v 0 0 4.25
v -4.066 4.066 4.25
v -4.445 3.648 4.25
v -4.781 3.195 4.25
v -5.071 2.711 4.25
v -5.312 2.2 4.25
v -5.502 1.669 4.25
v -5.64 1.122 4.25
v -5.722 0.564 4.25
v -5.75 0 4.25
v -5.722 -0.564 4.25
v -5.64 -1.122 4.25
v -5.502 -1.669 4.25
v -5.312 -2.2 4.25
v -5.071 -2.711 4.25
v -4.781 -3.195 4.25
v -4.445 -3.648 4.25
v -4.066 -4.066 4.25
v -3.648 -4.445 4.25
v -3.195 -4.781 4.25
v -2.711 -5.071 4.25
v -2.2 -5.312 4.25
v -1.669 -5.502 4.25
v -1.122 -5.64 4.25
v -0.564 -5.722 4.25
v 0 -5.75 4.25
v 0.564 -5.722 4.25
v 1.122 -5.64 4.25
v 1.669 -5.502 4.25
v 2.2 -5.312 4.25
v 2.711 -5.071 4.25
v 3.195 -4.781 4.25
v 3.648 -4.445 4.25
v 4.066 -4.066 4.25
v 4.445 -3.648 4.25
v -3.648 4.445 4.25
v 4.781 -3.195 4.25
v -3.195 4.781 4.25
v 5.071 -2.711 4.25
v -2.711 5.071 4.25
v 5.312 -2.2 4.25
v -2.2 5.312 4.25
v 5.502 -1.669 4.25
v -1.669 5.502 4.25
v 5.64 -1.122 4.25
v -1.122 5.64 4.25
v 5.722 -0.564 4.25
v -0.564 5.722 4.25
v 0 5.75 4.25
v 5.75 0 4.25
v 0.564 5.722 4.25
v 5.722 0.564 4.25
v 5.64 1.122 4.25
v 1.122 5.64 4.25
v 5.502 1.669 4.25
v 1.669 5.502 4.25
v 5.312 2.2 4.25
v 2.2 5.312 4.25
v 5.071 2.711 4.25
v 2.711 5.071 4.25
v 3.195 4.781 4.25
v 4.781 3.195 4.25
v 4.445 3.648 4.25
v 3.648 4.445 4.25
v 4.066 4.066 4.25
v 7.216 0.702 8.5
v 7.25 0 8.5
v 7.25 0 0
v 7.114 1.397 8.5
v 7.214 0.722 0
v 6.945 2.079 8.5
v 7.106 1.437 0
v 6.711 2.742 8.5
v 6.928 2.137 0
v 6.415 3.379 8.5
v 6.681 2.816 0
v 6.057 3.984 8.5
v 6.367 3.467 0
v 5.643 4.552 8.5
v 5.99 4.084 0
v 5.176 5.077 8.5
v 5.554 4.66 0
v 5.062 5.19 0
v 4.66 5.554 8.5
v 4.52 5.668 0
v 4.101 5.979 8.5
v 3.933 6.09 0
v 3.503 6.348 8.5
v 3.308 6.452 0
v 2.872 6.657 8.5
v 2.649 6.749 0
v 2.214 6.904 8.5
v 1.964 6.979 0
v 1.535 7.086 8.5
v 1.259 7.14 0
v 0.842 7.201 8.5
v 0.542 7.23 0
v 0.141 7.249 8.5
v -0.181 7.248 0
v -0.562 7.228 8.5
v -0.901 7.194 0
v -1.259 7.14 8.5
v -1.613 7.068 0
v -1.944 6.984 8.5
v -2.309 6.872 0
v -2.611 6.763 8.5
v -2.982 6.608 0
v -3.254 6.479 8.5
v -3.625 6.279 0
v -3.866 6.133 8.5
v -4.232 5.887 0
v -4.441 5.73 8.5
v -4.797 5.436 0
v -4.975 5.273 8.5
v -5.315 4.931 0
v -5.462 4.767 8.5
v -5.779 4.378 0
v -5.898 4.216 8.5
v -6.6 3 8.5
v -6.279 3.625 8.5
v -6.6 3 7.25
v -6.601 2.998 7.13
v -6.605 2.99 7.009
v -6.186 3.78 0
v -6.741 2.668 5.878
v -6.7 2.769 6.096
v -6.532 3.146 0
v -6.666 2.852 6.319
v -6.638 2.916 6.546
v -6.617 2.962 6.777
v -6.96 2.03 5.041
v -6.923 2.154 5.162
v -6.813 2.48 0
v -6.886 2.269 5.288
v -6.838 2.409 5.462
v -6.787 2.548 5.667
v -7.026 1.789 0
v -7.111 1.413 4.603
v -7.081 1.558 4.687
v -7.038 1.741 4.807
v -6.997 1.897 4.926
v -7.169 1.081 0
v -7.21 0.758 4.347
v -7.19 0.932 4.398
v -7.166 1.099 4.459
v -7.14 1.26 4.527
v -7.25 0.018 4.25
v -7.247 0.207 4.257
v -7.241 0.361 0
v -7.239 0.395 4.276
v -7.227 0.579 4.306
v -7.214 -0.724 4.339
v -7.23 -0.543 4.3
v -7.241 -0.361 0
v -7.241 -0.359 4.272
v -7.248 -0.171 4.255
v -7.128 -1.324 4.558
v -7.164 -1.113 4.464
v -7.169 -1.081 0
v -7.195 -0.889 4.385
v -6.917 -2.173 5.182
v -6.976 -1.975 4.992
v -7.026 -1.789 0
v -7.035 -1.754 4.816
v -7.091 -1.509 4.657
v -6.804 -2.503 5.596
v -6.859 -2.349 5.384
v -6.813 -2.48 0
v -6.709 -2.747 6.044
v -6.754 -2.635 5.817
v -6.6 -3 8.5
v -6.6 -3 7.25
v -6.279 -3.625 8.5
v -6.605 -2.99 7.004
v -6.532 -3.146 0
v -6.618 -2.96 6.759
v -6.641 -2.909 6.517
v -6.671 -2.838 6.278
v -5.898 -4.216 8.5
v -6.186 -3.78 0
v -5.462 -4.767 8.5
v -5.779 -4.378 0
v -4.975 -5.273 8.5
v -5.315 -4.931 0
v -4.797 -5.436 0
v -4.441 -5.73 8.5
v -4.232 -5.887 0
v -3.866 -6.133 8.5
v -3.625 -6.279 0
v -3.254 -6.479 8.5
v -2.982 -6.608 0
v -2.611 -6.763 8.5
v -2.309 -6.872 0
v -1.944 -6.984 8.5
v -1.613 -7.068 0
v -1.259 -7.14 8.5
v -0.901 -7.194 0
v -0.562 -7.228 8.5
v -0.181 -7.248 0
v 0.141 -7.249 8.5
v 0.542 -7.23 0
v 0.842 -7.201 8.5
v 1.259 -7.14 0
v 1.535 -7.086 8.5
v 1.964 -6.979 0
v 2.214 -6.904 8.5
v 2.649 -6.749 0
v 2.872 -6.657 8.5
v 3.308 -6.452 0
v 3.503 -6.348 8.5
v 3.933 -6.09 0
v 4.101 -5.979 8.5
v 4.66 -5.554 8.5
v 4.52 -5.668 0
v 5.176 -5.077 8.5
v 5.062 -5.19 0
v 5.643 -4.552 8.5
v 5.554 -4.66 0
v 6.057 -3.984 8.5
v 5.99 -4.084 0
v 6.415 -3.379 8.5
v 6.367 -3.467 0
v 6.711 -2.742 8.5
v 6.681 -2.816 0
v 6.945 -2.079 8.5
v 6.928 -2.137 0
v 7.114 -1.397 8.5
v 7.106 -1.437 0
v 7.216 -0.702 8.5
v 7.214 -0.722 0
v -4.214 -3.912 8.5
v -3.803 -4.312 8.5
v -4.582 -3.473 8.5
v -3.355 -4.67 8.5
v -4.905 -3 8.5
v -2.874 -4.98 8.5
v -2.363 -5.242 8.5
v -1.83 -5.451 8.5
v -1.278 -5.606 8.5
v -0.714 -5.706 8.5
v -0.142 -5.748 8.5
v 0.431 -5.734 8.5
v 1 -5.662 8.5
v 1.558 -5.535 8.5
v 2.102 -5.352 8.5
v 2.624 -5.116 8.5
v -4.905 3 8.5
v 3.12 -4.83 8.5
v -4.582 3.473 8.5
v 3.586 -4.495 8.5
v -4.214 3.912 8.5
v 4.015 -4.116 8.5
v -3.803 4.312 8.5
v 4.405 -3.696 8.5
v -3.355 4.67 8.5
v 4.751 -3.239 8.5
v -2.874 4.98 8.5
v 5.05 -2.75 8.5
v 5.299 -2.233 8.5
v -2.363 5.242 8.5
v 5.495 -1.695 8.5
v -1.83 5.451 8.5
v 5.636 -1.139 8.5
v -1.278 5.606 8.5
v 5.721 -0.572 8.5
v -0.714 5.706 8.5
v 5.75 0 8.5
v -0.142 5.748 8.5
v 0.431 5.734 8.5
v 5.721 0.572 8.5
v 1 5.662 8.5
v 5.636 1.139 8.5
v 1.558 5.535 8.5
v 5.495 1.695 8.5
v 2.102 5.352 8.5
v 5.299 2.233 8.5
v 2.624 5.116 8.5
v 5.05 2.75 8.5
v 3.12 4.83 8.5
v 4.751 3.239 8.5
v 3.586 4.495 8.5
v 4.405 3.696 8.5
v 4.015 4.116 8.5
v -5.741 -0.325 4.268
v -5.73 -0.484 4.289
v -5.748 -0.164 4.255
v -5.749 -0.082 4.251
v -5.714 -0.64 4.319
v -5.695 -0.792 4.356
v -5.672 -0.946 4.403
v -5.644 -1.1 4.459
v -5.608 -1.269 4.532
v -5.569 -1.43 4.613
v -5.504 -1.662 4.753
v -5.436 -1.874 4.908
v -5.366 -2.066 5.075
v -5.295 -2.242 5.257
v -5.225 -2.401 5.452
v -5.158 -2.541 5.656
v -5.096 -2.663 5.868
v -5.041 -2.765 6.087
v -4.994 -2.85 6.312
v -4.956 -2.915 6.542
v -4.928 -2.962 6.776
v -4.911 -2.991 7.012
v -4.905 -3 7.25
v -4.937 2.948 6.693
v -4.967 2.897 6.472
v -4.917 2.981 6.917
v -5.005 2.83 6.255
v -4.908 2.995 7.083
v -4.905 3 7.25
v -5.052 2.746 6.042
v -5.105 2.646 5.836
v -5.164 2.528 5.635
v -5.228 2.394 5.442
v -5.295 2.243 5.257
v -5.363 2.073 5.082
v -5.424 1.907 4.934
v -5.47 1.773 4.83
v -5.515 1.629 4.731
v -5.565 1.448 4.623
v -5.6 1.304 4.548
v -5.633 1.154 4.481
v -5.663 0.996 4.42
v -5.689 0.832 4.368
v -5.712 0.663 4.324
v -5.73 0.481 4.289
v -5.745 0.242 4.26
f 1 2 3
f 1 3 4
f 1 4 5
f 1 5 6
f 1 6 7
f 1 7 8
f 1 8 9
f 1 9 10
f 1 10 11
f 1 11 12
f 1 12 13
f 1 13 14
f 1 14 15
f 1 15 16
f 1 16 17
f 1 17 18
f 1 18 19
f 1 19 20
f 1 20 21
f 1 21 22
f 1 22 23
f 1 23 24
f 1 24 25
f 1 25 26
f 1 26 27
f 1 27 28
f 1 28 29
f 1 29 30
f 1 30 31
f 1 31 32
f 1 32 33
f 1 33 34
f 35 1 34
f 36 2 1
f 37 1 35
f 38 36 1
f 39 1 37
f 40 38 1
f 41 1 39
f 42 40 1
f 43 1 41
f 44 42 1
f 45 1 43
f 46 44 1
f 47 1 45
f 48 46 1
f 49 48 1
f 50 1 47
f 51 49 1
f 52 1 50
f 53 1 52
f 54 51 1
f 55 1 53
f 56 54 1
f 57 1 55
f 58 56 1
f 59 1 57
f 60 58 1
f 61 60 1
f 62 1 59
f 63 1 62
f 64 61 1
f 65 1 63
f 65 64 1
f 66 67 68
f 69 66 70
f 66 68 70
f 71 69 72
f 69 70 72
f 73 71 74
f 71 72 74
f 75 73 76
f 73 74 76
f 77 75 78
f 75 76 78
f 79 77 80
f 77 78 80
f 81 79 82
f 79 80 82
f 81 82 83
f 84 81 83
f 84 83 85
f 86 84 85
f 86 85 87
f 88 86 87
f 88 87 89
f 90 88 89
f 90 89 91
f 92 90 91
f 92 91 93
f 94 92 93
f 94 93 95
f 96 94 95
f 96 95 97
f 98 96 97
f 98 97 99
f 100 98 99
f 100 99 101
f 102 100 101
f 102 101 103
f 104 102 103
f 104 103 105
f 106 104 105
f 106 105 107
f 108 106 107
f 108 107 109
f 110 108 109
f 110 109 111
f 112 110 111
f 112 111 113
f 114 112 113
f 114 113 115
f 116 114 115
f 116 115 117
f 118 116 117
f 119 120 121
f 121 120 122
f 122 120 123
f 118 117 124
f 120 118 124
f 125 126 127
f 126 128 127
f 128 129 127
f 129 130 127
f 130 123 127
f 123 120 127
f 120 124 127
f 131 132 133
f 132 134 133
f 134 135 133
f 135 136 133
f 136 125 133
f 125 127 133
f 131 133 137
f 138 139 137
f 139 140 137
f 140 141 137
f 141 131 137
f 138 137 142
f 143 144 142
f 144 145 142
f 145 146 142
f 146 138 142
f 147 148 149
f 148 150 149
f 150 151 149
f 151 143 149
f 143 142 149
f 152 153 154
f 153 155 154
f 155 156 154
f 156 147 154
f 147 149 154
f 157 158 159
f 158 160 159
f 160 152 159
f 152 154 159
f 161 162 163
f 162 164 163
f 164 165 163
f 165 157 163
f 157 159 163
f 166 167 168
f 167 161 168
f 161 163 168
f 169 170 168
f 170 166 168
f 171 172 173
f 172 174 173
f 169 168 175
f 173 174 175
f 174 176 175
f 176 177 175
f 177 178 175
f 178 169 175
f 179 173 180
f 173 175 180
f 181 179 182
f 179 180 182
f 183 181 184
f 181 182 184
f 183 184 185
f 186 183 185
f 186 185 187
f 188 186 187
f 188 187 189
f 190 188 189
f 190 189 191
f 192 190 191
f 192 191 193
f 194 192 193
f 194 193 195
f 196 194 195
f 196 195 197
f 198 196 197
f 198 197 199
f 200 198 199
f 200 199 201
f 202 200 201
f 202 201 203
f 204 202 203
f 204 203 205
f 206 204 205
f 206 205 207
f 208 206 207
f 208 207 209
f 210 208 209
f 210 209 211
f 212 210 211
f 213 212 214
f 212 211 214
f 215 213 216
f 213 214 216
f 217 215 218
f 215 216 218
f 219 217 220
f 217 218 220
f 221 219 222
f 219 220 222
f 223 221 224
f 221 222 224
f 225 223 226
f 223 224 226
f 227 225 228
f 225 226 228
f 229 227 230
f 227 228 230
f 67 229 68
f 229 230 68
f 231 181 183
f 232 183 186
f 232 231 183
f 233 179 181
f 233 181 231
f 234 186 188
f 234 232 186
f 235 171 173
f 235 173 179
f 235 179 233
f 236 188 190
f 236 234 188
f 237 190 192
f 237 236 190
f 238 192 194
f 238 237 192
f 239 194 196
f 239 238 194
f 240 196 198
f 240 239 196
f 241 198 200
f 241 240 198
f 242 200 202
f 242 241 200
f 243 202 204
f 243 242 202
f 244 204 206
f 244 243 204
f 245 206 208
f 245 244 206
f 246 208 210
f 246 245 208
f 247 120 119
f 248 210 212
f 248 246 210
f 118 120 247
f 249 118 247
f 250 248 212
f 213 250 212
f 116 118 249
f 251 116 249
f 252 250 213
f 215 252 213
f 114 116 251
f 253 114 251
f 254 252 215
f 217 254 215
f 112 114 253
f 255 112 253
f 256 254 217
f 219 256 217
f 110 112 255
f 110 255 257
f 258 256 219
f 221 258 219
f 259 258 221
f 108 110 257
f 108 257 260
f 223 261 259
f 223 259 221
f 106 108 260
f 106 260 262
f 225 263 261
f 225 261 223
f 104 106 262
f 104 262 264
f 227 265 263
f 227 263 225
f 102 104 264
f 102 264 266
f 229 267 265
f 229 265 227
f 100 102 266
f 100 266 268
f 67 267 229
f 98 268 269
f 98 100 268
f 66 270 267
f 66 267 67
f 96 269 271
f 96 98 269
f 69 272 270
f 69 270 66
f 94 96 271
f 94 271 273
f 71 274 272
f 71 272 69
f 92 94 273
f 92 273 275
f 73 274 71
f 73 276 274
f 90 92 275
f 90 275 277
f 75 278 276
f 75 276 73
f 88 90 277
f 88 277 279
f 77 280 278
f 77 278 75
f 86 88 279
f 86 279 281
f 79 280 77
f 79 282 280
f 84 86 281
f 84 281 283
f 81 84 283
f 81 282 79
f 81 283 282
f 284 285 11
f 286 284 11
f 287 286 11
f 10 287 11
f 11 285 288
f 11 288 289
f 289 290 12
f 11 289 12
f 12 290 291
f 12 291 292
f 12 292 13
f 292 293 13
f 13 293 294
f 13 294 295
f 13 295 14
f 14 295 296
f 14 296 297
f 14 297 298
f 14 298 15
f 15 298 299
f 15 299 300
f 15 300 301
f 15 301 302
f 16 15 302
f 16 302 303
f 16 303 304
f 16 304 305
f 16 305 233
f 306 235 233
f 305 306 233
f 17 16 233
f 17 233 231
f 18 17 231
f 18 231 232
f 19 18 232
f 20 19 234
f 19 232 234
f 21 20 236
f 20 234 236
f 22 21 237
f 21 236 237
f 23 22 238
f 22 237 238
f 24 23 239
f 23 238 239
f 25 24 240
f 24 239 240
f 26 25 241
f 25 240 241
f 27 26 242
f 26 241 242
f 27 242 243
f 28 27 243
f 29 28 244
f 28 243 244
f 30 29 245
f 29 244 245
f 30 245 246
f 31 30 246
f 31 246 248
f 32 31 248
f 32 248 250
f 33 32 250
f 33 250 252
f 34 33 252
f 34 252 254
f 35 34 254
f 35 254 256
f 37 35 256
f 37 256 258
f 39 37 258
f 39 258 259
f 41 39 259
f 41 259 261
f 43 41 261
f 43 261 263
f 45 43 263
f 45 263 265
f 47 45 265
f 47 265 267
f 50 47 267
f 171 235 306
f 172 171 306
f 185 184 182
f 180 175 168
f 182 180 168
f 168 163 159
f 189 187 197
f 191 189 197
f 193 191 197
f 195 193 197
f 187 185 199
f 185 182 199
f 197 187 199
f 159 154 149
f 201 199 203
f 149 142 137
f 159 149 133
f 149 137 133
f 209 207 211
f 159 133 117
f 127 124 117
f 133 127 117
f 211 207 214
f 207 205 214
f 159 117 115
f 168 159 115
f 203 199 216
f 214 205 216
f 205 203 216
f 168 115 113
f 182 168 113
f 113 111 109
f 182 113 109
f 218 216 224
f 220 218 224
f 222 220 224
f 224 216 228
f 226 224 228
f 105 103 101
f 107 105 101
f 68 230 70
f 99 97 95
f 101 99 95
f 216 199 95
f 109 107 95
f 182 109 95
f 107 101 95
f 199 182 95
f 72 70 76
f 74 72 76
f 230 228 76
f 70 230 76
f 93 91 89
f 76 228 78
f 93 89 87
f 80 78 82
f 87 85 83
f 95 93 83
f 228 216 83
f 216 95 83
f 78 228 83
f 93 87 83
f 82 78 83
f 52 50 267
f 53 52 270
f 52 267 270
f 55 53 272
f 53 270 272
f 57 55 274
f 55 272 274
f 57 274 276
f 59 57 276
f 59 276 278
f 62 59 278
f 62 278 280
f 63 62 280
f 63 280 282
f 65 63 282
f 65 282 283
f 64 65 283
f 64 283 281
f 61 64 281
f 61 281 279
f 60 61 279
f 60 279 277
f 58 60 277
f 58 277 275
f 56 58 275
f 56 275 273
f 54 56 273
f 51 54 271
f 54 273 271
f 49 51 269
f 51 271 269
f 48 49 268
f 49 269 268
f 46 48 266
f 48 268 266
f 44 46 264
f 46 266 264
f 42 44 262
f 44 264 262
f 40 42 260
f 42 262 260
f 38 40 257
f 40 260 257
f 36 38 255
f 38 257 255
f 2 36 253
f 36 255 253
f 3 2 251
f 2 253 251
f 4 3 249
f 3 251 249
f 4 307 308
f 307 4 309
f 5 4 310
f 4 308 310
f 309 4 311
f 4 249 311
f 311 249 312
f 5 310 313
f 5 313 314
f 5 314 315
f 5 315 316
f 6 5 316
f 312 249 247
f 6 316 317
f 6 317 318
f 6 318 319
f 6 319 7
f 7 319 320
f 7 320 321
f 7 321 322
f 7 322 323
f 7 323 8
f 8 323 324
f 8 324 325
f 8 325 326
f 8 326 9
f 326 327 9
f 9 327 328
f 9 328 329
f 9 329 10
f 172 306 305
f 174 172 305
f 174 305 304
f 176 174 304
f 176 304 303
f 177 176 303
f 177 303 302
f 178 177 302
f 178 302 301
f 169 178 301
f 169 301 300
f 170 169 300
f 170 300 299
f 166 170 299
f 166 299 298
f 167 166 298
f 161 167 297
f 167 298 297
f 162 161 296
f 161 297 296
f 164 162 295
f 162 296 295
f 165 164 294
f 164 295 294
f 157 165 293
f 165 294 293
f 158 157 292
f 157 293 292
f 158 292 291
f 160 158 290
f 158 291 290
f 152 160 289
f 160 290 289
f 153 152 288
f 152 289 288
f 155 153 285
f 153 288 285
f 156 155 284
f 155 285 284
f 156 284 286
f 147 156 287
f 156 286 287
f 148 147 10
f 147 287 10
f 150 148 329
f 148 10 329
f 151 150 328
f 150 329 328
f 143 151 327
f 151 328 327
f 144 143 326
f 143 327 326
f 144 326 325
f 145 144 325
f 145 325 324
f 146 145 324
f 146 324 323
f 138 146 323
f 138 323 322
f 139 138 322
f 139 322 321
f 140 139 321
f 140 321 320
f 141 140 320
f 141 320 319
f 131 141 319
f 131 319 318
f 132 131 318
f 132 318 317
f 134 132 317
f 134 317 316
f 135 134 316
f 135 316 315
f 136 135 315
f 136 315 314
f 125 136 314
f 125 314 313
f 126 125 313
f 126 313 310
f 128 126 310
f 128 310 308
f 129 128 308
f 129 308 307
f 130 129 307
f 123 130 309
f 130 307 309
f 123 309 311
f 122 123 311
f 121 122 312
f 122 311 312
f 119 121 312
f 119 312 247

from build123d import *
from build123d import SkipClean  # not in build123d's __all__

# Parameters (mm, degrees)
F0_R     = 7.25
F1_DEPTH = 8.5
F2_R     = 5.75
F3_DEPTH = 4.25
F5_DEPTH = 25


with BuildPart() as f1:
    # F0 (on Top) → F1 (new body)
    with BuildSketch(Plane.XY):
        Circle(F0_R)
    extrude(amount=F1_DEPTH)

    # F2 (on face) → F3 (cut)
    with BuildSketch(Plane.XY.offset(8.5)):
        Circle(F2_R)
    extrude(amount=-F3_DEPTH, mode=Mode.SUBTRACT)

    # F4 (on Right) → F5 (cut)
    with BuildSketch(Plane.YZ):
        with BuildLine():
            Line((-3, 9.0031314455), (-3, 7.25))
            ThreePointArc((-3, 7.25), (0, 4.25), (3, 7.25))
            Line((3, 7.25), (3, 9.0439899638))
            Line((3, 9.0439899638), (-3, 9.0031314455))
        make_face()
    with SkipClean():  # cleaning this boolean's faces spoils the solid; the shape is the same uncleaned
        extrude(amount=-F5_DEPTH, mode=Mode.SUBTRACT)


solid = f1.part
